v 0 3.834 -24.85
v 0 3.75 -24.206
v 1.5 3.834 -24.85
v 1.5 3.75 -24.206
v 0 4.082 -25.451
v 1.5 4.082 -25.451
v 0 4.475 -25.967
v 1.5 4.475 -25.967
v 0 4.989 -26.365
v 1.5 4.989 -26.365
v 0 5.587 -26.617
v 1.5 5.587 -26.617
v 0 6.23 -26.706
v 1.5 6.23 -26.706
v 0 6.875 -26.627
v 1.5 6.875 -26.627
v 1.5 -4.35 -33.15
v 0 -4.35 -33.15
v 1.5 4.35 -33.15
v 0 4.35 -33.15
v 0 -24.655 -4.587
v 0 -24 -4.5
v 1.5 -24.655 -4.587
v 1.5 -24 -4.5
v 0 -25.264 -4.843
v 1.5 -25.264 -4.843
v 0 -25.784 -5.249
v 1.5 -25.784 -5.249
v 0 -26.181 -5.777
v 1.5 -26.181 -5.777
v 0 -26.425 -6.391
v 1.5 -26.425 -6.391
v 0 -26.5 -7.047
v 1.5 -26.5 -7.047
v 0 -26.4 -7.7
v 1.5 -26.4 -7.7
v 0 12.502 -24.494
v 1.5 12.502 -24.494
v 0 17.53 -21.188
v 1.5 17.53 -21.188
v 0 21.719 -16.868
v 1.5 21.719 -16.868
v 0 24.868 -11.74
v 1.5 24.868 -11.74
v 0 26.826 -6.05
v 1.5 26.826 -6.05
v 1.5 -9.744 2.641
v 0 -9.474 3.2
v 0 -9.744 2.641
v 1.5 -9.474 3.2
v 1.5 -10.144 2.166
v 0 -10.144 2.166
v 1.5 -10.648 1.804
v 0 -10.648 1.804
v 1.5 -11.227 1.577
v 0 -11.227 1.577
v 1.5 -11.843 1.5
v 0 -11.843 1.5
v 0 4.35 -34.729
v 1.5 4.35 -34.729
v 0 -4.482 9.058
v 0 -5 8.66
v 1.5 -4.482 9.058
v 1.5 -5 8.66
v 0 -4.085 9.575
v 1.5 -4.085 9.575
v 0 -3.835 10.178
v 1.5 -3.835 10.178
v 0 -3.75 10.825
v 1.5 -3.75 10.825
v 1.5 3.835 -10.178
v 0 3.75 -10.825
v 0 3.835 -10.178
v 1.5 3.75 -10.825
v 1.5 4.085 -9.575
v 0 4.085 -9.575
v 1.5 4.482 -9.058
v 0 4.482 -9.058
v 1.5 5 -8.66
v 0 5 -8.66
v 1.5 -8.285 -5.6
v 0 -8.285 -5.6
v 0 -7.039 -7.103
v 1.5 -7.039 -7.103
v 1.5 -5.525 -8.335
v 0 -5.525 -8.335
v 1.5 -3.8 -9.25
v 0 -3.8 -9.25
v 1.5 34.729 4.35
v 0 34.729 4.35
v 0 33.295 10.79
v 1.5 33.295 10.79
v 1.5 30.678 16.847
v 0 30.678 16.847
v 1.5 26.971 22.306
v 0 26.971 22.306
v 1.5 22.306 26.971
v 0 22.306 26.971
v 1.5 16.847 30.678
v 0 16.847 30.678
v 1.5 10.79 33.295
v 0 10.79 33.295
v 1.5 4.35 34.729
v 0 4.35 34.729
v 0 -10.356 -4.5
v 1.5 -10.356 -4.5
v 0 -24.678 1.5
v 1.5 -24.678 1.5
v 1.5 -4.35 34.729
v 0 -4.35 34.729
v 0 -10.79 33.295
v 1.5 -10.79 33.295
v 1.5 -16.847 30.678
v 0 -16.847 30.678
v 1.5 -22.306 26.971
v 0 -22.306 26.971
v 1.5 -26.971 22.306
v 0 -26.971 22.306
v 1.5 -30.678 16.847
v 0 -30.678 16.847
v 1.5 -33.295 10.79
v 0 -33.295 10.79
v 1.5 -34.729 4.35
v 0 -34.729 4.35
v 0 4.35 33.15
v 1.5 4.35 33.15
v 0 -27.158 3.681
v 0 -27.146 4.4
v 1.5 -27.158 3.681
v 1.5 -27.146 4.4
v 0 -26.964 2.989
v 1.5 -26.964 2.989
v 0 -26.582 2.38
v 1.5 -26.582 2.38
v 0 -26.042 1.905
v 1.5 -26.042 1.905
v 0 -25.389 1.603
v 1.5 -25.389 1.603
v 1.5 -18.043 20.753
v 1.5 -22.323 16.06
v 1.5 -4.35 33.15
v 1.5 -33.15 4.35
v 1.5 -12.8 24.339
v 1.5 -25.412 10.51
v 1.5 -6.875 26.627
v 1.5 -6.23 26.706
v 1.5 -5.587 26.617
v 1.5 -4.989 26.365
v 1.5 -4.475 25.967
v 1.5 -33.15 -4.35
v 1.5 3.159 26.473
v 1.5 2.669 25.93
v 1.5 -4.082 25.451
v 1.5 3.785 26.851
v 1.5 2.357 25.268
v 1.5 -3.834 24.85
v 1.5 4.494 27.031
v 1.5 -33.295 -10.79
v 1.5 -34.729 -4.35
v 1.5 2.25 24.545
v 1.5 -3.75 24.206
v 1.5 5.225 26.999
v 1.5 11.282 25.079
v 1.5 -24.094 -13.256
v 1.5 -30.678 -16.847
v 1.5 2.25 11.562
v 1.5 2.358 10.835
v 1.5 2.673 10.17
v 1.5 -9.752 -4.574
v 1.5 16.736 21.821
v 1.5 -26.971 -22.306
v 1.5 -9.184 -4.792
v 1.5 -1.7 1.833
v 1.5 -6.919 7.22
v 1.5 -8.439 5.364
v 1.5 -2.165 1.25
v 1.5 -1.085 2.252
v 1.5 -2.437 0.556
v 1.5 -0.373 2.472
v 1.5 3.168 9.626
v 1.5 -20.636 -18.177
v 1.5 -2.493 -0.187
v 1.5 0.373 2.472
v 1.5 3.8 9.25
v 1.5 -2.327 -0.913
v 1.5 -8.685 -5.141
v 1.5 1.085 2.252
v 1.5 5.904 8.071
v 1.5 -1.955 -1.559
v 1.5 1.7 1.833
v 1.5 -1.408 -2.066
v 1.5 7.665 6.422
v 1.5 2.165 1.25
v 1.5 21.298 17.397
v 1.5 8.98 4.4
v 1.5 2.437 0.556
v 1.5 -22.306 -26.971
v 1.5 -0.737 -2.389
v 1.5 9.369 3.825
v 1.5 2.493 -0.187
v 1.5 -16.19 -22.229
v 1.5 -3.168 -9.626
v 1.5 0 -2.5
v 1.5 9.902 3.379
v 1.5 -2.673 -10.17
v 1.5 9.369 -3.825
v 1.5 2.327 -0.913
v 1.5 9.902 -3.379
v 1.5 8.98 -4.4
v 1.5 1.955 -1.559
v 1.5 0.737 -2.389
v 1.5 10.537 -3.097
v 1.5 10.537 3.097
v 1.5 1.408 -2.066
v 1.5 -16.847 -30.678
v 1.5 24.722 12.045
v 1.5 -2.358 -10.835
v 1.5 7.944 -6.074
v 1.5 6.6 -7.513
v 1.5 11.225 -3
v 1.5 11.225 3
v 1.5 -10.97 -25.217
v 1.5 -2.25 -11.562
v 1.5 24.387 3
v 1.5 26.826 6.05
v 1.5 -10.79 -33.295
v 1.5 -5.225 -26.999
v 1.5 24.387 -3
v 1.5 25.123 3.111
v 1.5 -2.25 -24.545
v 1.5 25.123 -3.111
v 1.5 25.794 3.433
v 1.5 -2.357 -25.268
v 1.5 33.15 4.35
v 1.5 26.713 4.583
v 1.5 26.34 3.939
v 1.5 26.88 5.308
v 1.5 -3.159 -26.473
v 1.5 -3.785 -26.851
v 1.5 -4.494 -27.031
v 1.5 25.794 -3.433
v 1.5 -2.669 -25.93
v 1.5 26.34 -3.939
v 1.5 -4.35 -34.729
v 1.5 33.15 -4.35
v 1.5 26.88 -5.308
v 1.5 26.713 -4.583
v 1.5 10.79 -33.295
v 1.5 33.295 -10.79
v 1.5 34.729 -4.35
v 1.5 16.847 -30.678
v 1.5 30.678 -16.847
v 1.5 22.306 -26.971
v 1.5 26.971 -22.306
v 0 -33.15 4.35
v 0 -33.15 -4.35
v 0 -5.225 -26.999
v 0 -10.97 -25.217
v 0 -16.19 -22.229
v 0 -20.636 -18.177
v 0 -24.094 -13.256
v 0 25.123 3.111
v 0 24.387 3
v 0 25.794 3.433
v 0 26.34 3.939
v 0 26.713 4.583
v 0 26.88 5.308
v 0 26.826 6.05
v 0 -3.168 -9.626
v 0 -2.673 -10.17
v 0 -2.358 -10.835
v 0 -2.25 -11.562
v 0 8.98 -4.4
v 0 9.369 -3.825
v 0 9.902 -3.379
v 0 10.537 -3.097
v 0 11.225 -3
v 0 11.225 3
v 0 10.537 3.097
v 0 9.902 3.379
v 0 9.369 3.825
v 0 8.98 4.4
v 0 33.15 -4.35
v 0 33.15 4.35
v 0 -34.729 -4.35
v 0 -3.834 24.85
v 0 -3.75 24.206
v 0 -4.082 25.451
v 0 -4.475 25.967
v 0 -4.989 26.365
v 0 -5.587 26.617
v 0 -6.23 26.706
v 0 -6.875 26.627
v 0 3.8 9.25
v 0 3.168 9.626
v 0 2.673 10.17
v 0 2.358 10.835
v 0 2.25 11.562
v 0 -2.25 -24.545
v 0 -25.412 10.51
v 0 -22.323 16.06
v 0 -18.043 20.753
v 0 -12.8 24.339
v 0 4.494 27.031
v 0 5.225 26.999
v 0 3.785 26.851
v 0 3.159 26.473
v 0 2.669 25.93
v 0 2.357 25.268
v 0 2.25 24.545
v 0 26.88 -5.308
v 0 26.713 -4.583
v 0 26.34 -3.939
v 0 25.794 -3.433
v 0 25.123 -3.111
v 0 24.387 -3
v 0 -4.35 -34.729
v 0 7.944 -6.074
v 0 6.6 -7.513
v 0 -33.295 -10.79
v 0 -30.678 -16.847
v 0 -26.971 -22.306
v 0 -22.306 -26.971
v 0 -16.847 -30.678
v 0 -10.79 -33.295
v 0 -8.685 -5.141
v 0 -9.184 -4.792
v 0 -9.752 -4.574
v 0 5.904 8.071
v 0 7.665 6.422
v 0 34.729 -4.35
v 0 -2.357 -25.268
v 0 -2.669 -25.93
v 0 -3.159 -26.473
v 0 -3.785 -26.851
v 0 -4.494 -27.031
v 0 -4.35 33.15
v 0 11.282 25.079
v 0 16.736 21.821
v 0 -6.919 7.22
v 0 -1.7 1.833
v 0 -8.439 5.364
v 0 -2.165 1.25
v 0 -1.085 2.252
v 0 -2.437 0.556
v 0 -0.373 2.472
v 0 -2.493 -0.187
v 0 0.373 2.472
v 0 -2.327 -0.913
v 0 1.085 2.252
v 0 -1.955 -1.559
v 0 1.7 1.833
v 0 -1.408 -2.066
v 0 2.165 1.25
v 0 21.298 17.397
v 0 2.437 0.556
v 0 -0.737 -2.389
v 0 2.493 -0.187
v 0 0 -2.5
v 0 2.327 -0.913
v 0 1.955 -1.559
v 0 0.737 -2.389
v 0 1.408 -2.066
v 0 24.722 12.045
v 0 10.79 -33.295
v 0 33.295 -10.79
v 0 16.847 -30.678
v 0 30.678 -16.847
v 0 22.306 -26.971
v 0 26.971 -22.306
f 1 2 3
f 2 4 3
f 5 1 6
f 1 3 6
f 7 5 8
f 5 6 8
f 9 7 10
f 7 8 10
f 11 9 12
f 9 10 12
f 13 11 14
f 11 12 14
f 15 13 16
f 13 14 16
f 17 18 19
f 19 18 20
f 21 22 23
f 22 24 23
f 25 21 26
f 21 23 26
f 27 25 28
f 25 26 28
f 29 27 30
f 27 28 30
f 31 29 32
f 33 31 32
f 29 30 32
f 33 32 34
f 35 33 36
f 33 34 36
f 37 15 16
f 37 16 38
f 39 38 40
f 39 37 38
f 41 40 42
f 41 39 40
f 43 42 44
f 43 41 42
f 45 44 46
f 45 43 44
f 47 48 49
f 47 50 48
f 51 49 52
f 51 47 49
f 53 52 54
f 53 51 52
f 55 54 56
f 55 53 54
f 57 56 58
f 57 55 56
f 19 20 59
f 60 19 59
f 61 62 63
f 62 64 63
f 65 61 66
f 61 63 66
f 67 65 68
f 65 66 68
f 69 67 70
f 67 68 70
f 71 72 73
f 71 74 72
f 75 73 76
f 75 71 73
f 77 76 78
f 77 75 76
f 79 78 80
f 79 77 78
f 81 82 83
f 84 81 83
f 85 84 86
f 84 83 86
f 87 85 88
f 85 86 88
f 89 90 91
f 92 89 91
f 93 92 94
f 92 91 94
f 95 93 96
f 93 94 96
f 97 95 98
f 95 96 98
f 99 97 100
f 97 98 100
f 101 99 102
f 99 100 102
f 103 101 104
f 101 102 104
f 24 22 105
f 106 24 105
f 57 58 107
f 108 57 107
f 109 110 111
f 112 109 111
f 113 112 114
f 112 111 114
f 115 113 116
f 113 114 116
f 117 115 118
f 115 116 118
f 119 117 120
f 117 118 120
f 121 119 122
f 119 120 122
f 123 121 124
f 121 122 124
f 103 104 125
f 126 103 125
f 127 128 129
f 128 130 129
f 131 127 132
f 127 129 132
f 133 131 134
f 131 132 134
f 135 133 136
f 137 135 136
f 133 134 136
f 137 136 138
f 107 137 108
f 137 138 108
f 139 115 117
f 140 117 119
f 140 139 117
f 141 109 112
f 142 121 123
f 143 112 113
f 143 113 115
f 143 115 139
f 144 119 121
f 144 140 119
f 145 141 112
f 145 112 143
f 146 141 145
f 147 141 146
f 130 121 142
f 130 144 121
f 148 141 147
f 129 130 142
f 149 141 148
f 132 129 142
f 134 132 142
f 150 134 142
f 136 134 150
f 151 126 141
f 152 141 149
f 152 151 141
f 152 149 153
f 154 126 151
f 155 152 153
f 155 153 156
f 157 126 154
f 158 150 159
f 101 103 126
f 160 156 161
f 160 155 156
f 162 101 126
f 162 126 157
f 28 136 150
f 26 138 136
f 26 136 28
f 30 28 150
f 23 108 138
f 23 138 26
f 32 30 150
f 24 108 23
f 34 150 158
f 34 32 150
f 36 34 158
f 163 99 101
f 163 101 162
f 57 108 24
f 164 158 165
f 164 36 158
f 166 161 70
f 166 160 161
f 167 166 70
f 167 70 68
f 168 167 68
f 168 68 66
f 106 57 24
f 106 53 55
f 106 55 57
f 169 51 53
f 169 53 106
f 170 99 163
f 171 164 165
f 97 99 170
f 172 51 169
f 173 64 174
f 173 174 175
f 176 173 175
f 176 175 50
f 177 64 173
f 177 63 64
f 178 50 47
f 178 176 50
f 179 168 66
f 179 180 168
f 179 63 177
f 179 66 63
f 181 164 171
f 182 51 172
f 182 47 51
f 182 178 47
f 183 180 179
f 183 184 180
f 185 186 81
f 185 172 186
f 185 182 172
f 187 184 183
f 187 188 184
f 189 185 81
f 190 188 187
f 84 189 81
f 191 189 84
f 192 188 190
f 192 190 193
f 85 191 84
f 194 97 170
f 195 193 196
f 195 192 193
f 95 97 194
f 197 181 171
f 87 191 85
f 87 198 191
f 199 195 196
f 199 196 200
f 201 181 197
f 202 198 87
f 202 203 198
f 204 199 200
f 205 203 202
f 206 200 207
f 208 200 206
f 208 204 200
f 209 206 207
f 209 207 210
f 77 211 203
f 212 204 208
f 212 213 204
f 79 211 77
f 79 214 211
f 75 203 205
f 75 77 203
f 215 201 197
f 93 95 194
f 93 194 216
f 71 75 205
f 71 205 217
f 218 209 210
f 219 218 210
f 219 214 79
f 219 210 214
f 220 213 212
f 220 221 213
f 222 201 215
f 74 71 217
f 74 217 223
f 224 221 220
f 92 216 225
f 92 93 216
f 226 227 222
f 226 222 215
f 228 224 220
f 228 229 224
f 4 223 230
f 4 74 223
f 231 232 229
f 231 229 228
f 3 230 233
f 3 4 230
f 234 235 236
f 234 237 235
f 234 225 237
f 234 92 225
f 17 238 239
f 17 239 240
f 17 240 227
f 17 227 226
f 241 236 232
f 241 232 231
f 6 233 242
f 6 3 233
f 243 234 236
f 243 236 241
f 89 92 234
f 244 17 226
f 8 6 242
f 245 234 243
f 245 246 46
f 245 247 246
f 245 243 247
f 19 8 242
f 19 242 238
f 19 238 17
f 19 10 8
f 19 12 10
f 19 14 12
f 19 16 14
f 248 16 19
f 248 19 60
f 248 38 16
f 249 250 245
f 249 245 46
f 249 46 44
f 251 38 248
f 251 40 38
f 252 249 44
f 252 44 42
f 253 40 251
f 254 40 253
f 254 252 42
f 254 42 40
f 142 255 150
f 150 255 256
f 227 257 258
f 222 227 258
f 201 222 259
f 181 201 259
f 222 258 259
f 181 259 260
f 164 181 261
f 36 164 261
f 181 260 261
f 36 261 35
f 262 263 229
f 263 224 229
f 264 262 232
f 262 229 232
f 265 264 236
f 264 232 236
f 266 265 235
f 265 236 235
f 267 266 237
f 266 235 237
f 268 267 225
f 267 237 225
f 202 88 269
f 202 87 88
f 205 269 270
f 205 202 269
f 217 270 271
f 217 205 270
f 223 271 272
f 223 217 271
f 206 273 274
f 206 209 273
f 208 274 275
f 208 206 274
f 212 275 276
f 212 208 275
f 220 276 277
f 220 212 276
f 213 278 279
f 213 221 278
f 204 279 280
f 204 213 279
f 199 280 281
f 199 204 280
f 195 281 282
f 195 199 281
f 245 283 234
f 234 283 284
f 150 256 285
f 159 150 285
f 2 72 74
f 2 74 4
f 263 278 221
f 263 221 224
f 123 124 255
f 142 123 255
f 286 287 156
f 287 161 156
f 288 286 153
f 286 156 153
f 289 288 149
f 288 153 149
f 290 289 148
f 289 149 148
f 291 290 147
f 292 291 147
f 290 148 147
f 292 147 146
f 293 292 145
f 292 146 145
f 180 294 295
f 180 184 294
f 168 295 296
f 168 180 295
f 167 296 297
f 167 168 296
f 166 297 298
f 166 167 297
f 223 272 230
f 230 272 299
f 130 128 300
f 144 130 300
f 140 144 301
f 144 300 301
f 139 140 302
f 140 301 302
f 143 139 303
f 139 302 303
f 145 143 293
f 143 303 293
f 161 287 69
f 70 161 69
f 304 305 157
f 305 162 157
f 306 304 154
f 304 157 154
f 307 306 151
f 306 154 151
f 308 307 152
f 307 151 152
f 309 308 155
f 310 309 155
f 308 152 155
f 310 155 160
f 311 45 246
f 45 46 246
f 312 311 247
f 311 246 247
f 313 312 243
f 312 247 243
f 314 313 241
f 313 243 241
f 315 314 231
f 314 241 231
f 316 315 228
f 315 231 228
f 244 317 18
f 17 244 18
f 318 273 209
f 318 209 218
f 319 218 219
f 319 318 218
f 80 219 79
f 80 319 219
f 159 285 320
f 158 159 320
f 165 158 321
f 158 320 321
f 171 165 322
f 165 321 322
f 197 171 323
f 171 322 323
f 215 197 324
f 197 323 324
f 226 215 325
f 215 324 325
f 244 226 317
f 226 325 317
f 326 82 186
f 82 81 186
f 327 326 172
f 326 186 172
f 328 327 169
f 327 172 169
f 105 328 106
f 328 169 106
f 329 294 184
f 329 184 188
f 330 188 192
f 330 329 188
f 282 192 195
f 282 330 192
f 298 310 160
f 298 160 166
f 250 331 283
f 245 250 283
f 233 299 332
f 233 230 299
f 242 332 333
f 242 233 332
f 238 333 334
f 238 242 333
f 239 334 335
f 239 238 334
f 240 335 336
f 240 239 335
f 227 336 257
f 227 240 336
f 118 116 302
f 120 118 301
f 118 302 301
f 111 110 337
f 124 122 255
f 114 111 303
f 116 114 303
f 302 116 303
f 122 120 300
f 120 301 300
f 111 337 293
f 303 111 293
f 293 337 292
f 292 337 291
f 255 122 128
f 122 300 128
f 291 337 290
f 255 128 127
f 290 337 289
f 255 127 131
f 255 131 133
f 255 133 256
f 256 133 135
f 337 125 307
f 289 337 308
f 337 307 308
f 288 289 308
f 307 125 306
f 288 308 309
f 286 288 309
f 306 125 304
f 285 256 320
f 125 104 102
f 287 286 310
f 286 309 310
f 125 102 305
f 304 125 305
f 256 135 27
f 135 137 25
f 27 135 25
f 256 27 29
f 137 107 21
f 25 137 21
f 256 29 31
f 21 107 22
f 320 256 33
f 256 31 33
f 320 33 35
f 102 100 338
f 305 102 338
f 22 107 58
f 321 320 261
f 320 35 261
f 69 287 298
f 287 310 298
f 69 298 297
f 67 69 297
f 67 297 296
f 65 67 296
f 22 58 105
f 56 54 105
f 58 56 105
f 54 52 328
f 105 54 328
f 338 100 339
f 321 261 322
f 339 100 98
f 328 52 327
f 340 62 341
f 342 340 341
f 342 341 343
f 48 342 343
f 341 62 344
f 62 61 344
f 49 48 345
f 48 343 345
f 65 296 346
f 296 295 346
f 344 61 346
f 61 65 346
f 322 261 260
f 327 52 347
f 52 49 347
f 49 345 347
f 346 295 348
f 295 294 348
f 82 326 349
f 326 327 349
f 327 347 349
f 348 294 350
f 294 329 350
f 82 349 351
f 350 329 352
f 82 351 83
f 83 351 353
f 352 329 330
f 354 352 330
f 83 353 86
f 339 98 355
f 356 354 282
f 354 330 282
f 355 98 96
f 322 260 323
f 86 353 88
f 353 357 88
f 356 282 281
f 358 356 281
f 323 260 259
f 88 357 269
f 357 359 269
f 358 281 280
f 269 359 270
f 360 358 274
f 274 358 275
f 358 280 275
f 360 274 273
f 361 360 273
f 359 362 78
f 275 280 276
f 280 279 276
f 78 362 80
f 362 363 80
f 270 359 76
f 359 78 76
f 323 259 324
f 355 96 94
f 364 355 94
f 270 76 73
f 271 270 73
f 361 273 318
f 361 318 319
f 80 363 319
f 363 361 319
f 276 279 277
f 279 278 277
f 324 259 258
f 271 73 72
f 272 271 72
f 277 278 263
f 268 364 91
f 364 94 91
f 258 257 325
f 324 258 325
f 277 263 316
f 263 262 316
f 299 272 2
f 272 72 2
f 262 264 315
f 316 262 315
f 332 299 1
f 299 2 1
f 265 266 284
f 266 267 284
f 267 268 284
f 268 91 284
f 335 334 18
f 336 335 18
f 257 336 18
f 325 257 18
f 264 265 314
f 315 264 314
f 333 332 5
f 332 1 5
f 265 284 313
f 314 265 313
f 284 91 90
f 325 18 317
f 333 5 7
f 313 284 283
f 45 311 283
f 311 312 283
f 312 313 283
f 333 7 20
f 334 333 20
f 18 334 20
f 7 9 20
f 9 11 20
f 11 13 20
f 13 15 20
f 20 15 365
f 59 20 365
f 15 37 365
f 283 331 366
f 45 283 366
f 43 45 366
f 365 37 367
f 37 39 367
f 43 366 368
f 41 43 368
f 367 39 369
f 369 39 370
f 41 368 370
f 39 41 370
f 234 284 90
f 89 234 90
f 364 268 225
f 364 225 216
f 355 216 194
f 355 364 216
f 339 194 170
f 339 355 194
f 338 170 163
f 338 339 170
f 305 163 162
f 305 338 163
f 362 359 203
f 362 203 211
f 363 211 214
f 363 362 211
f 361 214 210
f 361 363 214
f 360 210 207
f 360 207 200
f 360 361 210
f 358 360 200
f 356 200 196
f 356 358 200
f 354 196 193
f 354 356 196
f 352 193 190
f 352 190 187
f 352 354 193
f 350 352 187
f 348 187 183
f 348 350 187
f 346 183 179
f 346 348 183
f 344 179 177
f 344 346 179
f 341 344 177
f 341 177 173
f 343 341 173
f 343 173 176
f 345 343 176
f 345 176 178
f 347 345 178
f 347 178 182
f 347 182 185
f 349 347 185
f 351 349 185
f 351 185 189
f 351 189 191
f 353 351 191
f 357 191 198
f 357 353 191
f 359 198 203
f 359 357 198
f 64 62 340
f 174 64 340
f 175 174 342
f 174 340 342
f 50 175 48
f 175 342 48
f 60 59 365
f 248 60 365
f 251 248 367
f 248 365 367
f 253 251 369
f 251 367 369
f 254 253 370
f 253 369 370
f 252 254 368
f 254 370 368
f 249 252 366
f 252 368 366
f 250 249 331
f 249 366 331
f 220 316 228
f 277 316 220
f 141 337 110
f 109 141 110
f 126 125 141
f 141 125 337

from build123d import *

# Parameters (mm, degrees)
SKETCH1_R           = 2.5
BOSS_EXTRUDE3_DEPTH = 1.5
FILLET1_R           = 2.5


with BuildPart() as part:
    # Sketch1 → Boss-Extrude3 (new body)
    with BuildSketch(Plane(origin=(0, 0, 0), x_dir=(0, 0, -1), z_dir=(1, 0, 0))):
        with BuildLine():
            Line((-34.72862652, 4.35), (-33.15, 4.35))
            Line((-33.15, 4.35), (-33.15, -4.35))
            Line((-33.15, -4.35), (-34.72862652, -4.35))
            ThreePointArc((-34.72862652, -4.35), (-24.748737342, -24.748737342), (-4.35, -34.72862652))
            Line((-4.35, -34.72862652), (-4.35, -33.15))
            Line((-4.35, -33.15), (4.35, -33.15))
            Line((4.35, -33.15), (4.35, -34.72862652))
            ThreePointArc((4.35, -34.72862652), (24.748737342, -24.748737342), (34.72862652, -4.35))
            Line((34.72862652, -4.35), (33.15, -4.35))
            Line((33.15, -4.35), (33.15, 4.35))
            Line((33.15, 4.35), (34.72862652, 4.35))
            ThreePointArc((34.72862652, 4.35), (24.748737342, 24.748737342), (4.35, 34.72862652))
            Line((4.35, 34.72862652), (4.35, 33.15))
            Line((4.35, 33.15), (-4.35, 33.15))
            Line((-4.35, 33.15), (-4.35, 34.72862652))
            ThreePointArc((-4.35, 34.72862652), (-24.748737342, 24.748737342), (-34.72862652, 4.35))
        make_face()
        Circle(SKETCH1_R, mode=Mode.SUBTRACT)
        with BuildLine():
            Line((9.270248109, 3.75), (27.243118397, 3.75))
            ThreePointArc((27.243118397, 3.75), (19.17641557, 19.71078603), (3, 27.335873866))
            Line((3, 27.335873866), (3, 9.539392014))
            ThreePointArc((3, 9.539392014), (6.783731432, 7.347175502), (9.270248109, 3.75))
        make_face(mode=Mode.SUBTRACT)
        with BuildLine():
            Line((-3, 9.539392014), (-3, 27.335873866))
            ThreePointArc((-3, 27.335873866), (-19.709993452, 19.177230199), (-27.407799985, 2.25))
            Line((-27.407799985, 2.25), (-9.743587635, 2.25))
            ThreePointArc((-9.743587635, 2.25), (-7.340542585, 6.790908228), (-3, 9.539392014))
        make_face(mode=Mode.SUBTRACT)
        with BuildLine():
            Line((9.743587635, -2.25), (27.407799985, -2.25))
            ThreePointArc((27.407799985, -2.25), (20.230473673, -18.627343744), (4.5, -27.129319933))
            Line((4.5, -27.129319933), (4.5, -8.93028555))
            ThreePointArc((4.5, -8.93028555), (7.866161766, -6.174422974), (9.743587635, -2.25))
        make_face(mode=Mode.SUBTRACT)
        with BuildLine():
            Line((-1.5, -9.886859967), (-1.5, -27.459060435))
            ThreePointArc((-1.5, -27.459060435), (-18.629857769, -20.22815858), (-27.243118397, -3.75))
            Line((-27.243118397, -3.75), (-9.270248109, -3.75))
            ThreePointArc((-9.270248109, -3.75), (-6.197969316, -7.847622338), (-1.5, -9.886859967))
        make_face(mode=Mode.SUBTRACT)
    extrude(amount=BOSS_EXTRUDE3_DEPTH)

    # Fillet1
    fillet1_edges = [part.edges().sort_by_distance(p)[0] for p in [
        (0.75, -9.886859967, 1.5),
        (0.75, -3.75, 9.270248109),
        (0.75, -3.75, 27.243118397),
        (0.75, -27.459060435, 1.5),
        (0.75, 27.335873866, 3),
        (0.75, 2.25, 27.407799985),
        (0.75, 2.25, 9.743587635),
        (0.75, 9.539392014, 3),
        (0.75, 3.75, -27.243118397),
        (0.75, 27.335873866, -3),
        (0.75, 9.539392014, -3),
        (0.75, 3.75, -9.270248109),
        (0.75, -2.25, -9.743587635),
        (0.75, -8.93028555, -4.5),
        (0.75, -27.129319933, -4.5),
        (0.75, -2.25, -27.407799985),
    ]]
    fillet(fillet1_edges, radius=FILLET1_R)


solid = part.part
